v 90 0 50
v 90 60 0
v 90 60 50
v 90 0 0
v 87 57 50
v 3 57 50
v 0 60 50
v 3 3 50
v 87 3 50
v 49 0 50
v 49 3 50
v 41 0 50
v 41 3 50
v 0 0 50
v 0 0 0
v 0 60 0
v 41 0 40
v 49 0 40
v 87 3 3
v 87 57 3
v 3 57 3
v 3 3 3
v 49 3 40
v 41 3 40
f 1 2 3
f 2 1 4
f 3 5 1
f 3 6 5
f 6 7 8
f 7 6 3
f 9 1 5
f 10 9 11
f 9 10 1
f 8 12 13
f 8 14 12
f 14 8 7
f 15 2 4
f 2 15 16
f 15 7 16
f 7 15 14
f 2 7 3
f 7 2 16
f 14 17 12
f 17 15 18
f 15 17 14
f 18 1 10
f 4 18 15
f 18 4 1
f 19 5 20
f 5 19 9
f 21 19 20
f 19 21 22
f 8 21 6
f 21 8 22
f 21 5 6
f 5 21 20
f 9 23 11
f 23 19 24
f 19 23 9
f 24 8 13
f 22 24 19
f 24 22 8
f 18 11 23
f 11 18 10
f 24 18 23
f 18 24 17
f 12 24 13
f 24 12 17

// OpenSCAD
$fn = 32;

// ----------------------------------------------------------------------
// Enclosure box: notch enclosure
// ----------------------------------------------------------------------

// --- parameters (mm) ---
box_l = 90;               // outer length, X
box_w = 60;               // outer width, Y
box_h = 50;               // outer height
wall_t = 3;               // wall thickness
notch_w = 8;              // cable notch width
notch_h = 10;             // cable notch height

inner_h = box_h - wall_t;  // cavity depth
boss_h = inner_h - 2;  // corner boss height

difference() {
  cube([box_l, box_w, box_h]);
  translate([wall_t, wall_t, wall_t])
    cube([box_l - 2 * wall_t, box_w - 2 * wall_t, box_h]);
  translate([box_l / 2 - notch_w / 2, -1, box_h - notch_h])
    cube([notch_w, wall_t + 2, notch_h + 1]);
}
